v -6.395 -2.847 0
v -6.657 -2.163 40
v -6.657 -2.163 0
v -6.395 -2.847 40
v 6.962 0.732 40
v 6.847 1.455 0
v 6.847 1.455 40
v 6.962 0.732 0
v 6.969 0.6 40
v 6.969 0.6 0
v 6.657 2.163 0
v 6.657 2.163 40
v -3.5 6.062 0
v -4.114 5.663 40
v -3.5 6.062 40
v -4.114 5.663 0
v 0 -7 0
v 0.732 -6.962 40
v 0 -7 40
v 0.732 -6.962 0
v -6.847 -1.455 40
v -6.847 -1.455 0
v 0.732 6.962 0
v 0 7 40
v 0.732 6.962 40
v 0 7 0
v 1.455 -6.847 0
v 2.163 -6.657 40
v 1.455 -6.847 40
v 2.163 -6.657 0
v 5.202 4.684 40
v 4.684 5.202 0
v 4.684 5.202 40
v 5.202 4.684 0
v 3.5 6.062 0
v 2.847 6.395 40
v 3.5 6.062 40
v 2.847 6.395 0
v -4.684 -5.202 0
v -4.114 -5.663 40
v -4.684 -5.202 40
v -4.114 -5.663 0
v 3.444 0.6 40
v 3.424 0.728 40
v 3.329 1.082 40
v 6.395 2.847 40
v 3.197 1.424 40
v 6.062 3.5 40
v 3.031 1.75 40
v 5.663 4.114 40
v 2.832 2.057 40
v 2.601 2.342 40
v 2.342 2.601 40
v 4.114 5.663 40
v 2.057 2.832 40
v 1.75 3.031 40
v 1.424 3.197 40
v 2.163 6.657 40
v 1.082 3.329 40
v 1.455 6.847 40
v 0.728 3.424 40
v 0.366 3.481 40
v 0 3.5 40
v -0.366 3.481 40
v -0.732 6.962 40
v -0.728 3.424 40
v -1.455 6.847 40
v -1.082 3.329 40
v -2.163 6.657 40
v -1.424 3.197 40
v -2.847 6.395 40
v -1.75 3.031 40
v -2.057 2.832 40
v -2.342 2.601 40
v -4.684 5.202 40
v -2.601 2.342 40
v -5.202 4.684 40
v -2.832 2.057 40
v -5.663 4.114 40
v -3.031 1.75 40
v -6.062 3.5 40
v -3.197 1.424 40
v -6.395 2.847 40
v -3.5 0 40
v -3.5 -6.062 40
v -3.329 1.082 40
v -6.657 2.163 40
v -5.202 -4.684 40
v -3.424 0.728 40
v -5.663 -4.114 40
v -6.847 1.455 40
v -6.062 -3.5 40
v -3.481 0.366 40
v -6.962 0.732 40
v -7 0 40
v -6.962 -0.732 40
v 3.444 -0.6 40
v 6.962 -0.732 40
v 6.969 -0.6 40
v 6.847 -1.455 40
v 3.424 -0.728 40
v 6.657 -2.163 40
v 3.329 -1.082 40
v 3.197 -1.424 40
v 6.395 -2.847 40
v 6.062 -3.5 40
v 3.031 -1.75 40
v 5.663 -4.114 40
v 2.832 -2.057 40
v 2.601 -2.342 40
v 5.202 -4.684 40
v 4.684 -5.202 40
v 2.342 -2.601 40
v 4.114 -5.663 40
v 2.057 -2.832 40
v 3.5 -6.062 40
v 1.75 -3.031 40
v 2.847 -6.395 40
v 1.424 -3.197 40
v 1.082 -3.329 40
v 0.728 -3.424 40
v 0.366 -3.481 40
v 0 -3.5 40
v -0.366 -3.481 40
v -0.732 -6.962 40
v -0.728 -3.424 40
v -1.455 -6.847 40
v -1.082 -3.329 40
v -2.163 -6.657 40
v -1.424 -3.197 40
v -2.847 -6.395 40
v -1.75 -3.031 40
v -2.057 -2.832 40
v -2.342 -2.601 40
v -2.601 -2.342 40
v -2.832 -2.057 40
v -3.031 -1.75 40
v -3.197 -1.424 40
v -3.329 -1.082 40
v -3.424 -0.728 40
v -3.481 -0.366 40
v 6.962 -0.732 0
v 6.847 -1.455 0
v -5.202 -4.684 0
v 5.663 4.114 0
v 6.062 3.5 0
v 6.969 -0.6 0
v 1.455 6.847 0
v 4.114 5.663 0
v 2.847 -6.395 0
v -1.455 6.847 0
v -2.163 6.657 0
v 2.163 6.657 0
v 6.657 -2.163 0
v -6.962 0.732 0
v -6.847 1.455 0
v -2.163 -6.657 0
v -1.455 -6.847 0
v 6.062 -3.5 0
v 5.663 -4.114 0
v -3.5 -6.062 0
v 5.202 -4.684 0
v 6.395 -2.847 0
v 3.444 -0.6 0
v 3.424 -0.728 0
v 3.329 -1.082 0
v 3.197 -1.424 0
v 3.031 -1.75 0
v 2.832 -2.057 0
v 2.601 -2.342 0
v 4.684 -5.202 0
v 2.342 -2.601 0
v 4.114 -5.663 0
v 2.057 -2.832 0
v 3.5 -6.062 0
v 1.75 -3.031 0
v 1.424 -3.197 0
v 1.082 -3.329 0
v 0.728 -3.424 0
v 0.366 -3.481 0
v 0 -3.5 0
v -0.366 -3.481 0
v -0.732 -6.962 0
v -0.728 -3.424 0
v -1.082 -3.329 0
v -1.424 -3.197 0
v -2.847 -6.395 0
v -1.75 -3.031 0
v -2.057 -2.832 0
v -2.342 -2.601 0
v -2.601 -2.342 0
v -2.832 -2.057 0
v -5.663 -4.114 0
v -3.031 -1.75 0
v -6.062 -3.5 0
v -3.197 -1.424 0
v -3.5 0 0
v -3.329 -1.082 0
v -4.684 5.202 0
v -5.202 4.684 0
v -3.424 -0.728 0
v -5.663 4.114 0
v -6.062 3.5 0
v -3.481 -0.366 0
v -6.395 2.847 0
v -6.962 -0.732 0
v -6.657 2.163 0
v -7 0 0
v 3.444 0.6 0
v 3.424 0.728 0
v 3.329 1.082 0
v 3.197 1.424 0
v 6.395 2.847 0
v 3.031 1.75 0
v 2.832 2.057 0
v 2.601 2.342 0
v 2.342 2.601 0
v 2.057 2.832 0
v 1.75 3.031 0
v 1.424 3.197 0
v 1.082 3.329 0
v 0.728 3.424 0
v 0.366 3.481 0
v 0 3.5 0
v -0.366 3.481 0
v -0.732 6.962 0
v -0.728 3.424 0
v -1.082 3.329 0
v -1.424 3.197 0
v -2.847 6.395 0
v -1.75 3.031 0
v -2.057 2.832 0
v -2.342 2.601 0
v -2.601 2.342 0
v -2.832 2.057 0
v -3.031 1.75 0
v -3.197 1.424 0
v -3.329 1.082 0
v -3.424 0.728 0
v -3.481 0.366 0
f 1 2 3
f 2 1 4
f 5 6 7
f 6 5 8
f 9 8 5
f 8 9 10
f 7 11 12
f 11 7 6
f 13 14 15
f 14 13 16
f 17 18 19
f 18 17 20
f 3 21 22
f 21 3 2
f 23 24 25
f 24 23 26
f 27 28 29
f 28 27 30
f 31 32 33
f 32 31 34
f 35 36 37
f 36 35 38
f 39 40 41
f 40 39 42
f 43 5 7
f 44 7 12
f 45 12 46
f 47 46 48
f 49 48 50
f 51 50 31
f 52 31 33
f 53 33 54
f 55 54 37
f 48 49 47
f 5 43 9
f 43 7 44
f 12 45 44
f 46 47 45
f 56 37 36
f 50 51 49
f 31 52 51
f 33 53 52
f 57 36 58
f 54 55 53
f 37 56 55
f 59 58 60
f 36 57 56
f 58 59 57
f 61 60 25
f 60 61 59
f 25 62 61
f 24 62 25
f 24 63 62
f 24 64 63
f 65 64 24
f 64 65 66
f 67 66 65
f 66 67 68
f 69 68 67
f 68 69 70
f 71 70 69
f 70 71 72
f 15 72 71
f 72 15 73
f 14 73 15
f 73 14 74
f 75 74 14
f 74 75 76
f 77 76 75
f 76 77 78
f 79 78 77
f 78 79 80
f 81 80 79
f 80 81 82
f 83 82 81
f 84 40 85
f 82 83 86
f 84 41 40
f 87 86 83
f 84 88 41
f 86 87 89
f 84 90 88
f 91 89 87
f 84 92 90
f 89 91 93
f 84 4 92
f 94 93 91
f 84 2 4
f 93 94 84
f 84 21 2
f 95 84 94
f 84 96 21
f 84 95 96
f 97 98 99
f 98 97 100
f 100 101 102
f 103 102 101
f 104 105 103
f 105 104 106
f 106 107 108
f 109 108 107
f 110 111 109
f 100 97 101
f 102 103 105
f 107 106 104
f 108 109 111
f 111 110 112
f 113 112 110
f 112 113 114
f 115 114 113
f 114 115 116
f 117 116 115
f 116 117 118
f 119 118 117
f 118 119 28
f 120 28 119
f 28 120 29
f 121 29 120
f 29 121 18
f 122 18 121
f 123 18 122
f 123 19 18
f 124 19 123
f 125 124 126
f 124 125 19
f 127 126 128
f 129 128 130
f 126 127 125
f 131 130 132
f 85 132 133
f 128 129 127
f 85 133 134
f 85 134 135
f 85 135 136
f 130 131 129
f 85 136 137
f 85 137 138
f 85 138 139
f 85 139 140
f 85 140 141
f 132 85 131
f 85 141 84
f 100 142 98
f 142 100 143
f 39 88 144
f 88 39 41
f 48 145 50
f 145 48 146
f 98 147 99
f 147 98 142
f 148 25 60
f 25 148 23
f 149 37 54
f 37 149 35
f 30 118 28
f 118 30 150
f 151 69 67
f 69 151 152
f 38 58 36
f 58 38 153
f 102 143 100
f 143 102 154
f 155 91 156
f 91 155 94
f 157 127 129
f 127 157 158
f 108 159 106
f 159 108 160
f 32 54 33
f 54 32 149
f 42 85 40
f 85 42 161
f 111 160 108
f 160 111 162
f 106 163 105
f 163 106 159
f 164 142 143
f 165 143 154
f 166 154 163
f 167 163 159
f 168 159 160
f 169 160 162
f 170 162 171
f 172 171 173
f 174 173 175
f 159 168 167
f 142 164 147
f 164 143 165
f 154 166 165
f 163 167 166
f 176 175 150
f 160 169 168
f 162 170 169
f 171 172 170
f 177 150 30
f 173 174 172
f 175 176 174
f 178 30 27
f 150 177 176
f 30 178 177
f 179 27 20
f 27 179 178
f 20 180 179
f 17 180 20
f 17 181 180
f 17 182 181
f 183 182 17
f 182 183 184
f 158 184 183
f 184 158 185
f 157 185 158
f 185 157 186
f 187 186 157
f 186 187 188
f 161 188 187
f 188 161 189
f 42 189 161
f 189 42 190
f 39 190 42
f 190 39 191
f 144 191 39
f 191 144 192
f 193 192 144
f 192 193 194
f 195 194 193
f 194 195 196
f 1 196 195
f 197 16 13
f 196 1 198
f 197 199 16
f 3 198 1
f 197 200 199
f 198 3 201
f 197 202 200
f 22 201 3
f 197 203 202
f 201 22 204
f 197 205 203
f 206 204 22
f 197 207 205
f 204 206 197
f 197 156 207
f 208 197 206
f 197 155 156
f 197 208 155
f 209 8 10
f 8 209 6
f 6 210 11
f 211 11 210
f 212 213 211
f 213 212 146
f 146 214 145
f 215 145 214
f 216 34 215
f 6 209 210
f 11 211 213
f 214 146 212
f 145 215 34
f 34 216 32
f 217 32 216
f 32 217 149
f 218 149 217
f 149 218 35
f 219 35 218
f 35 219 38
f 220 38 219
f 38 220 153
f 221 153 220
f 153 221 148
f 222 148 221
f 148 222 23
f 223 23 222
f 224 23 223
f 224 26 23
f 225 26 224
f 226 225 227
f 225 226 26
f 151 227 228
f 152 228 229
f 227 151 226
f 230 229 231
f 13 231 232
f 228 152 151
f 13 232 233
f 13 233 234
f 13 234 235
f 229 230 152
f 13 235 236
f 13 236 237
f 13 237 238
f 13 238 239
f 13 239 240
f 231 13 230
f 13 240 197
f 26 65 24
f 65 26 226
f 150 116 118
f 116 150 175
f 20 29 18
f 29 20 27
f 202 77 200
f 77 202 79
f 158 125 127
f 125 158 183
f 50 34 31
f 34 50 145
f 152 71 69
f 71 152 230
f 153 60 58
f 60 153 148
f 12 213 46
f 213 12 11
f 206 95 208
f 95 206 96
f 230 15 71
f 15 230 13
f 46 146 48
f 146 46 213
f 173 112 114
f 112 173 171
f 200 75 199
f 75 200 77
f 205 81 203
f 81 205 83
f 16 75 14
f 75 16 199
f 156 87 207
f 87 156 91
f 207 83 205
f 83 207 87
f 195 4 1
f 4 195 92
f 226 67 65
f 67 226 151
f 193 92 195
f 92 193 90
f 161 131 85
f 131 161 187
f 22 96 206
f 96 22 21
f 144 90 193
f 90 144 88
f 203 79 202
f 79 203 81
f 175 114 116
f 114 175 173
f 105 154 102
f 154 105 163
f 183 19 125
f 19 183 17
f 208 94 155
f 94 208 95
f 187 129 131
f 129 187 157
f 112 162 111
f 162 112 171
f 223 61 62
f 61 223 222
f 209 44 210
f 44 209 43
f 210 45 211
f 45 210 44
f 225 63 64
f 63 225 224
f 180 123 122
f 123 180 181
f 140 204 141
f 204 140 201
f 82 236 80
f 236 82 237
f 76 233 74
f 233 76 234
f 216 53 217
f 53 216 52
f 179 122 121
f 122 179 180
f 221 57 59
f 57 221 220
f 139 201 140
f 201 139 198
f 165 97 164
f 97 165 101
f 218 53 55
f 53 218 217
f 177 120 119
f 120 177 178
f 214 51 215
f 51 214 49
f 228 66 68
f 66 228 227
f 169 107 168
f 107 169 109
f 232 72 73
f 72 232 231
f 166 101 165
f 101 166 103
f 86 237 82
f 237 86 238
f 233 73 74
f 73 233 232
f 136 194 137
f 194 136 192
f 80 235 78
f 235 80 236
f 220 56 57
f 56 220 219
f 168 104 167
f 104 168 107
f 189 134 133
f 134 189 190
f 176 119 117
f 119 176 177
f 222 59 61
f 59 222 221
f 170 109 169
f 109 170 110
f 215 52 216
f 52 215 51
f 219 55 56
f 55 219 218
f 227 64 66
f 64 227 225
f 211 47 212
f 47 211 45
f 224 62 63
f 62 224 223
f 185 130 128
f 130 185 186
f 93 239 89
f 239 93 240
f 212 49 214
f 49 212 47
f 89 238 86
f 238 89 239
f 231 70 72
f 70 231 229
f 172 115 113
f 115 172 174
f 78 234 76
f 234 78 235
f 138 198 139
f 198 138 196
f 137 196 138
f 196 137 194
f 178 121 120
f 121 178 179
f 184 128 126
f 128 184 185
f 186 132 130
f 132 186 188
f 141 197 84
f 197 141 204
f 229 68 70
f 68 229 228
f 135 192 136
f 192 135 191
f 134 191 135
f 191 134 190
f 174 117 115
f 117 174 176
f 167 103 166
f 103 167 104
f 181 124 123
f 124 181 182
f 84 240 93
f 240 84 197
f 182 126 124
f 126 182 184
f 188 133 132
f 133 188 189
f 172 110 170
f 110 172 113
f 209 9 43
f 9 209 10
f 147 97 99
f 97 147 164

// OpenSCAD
// Slotted spring pin sleeve.
$fn = 60;
eps = 0.02;
inner_d = 7;
outer_d = 14;
length = 40;
slot_w = 1.2;
difference() {
    cylinder(d = outer_d, h = length);
    translate([0, 0, -eps]) cylinder(d = inner_d, h = length + 2 * eps);
    translate([0, -slot_w / 2, -eps]) cube([outer_d / 2 + eps, slot_w, length + 2 * eps]);
}
